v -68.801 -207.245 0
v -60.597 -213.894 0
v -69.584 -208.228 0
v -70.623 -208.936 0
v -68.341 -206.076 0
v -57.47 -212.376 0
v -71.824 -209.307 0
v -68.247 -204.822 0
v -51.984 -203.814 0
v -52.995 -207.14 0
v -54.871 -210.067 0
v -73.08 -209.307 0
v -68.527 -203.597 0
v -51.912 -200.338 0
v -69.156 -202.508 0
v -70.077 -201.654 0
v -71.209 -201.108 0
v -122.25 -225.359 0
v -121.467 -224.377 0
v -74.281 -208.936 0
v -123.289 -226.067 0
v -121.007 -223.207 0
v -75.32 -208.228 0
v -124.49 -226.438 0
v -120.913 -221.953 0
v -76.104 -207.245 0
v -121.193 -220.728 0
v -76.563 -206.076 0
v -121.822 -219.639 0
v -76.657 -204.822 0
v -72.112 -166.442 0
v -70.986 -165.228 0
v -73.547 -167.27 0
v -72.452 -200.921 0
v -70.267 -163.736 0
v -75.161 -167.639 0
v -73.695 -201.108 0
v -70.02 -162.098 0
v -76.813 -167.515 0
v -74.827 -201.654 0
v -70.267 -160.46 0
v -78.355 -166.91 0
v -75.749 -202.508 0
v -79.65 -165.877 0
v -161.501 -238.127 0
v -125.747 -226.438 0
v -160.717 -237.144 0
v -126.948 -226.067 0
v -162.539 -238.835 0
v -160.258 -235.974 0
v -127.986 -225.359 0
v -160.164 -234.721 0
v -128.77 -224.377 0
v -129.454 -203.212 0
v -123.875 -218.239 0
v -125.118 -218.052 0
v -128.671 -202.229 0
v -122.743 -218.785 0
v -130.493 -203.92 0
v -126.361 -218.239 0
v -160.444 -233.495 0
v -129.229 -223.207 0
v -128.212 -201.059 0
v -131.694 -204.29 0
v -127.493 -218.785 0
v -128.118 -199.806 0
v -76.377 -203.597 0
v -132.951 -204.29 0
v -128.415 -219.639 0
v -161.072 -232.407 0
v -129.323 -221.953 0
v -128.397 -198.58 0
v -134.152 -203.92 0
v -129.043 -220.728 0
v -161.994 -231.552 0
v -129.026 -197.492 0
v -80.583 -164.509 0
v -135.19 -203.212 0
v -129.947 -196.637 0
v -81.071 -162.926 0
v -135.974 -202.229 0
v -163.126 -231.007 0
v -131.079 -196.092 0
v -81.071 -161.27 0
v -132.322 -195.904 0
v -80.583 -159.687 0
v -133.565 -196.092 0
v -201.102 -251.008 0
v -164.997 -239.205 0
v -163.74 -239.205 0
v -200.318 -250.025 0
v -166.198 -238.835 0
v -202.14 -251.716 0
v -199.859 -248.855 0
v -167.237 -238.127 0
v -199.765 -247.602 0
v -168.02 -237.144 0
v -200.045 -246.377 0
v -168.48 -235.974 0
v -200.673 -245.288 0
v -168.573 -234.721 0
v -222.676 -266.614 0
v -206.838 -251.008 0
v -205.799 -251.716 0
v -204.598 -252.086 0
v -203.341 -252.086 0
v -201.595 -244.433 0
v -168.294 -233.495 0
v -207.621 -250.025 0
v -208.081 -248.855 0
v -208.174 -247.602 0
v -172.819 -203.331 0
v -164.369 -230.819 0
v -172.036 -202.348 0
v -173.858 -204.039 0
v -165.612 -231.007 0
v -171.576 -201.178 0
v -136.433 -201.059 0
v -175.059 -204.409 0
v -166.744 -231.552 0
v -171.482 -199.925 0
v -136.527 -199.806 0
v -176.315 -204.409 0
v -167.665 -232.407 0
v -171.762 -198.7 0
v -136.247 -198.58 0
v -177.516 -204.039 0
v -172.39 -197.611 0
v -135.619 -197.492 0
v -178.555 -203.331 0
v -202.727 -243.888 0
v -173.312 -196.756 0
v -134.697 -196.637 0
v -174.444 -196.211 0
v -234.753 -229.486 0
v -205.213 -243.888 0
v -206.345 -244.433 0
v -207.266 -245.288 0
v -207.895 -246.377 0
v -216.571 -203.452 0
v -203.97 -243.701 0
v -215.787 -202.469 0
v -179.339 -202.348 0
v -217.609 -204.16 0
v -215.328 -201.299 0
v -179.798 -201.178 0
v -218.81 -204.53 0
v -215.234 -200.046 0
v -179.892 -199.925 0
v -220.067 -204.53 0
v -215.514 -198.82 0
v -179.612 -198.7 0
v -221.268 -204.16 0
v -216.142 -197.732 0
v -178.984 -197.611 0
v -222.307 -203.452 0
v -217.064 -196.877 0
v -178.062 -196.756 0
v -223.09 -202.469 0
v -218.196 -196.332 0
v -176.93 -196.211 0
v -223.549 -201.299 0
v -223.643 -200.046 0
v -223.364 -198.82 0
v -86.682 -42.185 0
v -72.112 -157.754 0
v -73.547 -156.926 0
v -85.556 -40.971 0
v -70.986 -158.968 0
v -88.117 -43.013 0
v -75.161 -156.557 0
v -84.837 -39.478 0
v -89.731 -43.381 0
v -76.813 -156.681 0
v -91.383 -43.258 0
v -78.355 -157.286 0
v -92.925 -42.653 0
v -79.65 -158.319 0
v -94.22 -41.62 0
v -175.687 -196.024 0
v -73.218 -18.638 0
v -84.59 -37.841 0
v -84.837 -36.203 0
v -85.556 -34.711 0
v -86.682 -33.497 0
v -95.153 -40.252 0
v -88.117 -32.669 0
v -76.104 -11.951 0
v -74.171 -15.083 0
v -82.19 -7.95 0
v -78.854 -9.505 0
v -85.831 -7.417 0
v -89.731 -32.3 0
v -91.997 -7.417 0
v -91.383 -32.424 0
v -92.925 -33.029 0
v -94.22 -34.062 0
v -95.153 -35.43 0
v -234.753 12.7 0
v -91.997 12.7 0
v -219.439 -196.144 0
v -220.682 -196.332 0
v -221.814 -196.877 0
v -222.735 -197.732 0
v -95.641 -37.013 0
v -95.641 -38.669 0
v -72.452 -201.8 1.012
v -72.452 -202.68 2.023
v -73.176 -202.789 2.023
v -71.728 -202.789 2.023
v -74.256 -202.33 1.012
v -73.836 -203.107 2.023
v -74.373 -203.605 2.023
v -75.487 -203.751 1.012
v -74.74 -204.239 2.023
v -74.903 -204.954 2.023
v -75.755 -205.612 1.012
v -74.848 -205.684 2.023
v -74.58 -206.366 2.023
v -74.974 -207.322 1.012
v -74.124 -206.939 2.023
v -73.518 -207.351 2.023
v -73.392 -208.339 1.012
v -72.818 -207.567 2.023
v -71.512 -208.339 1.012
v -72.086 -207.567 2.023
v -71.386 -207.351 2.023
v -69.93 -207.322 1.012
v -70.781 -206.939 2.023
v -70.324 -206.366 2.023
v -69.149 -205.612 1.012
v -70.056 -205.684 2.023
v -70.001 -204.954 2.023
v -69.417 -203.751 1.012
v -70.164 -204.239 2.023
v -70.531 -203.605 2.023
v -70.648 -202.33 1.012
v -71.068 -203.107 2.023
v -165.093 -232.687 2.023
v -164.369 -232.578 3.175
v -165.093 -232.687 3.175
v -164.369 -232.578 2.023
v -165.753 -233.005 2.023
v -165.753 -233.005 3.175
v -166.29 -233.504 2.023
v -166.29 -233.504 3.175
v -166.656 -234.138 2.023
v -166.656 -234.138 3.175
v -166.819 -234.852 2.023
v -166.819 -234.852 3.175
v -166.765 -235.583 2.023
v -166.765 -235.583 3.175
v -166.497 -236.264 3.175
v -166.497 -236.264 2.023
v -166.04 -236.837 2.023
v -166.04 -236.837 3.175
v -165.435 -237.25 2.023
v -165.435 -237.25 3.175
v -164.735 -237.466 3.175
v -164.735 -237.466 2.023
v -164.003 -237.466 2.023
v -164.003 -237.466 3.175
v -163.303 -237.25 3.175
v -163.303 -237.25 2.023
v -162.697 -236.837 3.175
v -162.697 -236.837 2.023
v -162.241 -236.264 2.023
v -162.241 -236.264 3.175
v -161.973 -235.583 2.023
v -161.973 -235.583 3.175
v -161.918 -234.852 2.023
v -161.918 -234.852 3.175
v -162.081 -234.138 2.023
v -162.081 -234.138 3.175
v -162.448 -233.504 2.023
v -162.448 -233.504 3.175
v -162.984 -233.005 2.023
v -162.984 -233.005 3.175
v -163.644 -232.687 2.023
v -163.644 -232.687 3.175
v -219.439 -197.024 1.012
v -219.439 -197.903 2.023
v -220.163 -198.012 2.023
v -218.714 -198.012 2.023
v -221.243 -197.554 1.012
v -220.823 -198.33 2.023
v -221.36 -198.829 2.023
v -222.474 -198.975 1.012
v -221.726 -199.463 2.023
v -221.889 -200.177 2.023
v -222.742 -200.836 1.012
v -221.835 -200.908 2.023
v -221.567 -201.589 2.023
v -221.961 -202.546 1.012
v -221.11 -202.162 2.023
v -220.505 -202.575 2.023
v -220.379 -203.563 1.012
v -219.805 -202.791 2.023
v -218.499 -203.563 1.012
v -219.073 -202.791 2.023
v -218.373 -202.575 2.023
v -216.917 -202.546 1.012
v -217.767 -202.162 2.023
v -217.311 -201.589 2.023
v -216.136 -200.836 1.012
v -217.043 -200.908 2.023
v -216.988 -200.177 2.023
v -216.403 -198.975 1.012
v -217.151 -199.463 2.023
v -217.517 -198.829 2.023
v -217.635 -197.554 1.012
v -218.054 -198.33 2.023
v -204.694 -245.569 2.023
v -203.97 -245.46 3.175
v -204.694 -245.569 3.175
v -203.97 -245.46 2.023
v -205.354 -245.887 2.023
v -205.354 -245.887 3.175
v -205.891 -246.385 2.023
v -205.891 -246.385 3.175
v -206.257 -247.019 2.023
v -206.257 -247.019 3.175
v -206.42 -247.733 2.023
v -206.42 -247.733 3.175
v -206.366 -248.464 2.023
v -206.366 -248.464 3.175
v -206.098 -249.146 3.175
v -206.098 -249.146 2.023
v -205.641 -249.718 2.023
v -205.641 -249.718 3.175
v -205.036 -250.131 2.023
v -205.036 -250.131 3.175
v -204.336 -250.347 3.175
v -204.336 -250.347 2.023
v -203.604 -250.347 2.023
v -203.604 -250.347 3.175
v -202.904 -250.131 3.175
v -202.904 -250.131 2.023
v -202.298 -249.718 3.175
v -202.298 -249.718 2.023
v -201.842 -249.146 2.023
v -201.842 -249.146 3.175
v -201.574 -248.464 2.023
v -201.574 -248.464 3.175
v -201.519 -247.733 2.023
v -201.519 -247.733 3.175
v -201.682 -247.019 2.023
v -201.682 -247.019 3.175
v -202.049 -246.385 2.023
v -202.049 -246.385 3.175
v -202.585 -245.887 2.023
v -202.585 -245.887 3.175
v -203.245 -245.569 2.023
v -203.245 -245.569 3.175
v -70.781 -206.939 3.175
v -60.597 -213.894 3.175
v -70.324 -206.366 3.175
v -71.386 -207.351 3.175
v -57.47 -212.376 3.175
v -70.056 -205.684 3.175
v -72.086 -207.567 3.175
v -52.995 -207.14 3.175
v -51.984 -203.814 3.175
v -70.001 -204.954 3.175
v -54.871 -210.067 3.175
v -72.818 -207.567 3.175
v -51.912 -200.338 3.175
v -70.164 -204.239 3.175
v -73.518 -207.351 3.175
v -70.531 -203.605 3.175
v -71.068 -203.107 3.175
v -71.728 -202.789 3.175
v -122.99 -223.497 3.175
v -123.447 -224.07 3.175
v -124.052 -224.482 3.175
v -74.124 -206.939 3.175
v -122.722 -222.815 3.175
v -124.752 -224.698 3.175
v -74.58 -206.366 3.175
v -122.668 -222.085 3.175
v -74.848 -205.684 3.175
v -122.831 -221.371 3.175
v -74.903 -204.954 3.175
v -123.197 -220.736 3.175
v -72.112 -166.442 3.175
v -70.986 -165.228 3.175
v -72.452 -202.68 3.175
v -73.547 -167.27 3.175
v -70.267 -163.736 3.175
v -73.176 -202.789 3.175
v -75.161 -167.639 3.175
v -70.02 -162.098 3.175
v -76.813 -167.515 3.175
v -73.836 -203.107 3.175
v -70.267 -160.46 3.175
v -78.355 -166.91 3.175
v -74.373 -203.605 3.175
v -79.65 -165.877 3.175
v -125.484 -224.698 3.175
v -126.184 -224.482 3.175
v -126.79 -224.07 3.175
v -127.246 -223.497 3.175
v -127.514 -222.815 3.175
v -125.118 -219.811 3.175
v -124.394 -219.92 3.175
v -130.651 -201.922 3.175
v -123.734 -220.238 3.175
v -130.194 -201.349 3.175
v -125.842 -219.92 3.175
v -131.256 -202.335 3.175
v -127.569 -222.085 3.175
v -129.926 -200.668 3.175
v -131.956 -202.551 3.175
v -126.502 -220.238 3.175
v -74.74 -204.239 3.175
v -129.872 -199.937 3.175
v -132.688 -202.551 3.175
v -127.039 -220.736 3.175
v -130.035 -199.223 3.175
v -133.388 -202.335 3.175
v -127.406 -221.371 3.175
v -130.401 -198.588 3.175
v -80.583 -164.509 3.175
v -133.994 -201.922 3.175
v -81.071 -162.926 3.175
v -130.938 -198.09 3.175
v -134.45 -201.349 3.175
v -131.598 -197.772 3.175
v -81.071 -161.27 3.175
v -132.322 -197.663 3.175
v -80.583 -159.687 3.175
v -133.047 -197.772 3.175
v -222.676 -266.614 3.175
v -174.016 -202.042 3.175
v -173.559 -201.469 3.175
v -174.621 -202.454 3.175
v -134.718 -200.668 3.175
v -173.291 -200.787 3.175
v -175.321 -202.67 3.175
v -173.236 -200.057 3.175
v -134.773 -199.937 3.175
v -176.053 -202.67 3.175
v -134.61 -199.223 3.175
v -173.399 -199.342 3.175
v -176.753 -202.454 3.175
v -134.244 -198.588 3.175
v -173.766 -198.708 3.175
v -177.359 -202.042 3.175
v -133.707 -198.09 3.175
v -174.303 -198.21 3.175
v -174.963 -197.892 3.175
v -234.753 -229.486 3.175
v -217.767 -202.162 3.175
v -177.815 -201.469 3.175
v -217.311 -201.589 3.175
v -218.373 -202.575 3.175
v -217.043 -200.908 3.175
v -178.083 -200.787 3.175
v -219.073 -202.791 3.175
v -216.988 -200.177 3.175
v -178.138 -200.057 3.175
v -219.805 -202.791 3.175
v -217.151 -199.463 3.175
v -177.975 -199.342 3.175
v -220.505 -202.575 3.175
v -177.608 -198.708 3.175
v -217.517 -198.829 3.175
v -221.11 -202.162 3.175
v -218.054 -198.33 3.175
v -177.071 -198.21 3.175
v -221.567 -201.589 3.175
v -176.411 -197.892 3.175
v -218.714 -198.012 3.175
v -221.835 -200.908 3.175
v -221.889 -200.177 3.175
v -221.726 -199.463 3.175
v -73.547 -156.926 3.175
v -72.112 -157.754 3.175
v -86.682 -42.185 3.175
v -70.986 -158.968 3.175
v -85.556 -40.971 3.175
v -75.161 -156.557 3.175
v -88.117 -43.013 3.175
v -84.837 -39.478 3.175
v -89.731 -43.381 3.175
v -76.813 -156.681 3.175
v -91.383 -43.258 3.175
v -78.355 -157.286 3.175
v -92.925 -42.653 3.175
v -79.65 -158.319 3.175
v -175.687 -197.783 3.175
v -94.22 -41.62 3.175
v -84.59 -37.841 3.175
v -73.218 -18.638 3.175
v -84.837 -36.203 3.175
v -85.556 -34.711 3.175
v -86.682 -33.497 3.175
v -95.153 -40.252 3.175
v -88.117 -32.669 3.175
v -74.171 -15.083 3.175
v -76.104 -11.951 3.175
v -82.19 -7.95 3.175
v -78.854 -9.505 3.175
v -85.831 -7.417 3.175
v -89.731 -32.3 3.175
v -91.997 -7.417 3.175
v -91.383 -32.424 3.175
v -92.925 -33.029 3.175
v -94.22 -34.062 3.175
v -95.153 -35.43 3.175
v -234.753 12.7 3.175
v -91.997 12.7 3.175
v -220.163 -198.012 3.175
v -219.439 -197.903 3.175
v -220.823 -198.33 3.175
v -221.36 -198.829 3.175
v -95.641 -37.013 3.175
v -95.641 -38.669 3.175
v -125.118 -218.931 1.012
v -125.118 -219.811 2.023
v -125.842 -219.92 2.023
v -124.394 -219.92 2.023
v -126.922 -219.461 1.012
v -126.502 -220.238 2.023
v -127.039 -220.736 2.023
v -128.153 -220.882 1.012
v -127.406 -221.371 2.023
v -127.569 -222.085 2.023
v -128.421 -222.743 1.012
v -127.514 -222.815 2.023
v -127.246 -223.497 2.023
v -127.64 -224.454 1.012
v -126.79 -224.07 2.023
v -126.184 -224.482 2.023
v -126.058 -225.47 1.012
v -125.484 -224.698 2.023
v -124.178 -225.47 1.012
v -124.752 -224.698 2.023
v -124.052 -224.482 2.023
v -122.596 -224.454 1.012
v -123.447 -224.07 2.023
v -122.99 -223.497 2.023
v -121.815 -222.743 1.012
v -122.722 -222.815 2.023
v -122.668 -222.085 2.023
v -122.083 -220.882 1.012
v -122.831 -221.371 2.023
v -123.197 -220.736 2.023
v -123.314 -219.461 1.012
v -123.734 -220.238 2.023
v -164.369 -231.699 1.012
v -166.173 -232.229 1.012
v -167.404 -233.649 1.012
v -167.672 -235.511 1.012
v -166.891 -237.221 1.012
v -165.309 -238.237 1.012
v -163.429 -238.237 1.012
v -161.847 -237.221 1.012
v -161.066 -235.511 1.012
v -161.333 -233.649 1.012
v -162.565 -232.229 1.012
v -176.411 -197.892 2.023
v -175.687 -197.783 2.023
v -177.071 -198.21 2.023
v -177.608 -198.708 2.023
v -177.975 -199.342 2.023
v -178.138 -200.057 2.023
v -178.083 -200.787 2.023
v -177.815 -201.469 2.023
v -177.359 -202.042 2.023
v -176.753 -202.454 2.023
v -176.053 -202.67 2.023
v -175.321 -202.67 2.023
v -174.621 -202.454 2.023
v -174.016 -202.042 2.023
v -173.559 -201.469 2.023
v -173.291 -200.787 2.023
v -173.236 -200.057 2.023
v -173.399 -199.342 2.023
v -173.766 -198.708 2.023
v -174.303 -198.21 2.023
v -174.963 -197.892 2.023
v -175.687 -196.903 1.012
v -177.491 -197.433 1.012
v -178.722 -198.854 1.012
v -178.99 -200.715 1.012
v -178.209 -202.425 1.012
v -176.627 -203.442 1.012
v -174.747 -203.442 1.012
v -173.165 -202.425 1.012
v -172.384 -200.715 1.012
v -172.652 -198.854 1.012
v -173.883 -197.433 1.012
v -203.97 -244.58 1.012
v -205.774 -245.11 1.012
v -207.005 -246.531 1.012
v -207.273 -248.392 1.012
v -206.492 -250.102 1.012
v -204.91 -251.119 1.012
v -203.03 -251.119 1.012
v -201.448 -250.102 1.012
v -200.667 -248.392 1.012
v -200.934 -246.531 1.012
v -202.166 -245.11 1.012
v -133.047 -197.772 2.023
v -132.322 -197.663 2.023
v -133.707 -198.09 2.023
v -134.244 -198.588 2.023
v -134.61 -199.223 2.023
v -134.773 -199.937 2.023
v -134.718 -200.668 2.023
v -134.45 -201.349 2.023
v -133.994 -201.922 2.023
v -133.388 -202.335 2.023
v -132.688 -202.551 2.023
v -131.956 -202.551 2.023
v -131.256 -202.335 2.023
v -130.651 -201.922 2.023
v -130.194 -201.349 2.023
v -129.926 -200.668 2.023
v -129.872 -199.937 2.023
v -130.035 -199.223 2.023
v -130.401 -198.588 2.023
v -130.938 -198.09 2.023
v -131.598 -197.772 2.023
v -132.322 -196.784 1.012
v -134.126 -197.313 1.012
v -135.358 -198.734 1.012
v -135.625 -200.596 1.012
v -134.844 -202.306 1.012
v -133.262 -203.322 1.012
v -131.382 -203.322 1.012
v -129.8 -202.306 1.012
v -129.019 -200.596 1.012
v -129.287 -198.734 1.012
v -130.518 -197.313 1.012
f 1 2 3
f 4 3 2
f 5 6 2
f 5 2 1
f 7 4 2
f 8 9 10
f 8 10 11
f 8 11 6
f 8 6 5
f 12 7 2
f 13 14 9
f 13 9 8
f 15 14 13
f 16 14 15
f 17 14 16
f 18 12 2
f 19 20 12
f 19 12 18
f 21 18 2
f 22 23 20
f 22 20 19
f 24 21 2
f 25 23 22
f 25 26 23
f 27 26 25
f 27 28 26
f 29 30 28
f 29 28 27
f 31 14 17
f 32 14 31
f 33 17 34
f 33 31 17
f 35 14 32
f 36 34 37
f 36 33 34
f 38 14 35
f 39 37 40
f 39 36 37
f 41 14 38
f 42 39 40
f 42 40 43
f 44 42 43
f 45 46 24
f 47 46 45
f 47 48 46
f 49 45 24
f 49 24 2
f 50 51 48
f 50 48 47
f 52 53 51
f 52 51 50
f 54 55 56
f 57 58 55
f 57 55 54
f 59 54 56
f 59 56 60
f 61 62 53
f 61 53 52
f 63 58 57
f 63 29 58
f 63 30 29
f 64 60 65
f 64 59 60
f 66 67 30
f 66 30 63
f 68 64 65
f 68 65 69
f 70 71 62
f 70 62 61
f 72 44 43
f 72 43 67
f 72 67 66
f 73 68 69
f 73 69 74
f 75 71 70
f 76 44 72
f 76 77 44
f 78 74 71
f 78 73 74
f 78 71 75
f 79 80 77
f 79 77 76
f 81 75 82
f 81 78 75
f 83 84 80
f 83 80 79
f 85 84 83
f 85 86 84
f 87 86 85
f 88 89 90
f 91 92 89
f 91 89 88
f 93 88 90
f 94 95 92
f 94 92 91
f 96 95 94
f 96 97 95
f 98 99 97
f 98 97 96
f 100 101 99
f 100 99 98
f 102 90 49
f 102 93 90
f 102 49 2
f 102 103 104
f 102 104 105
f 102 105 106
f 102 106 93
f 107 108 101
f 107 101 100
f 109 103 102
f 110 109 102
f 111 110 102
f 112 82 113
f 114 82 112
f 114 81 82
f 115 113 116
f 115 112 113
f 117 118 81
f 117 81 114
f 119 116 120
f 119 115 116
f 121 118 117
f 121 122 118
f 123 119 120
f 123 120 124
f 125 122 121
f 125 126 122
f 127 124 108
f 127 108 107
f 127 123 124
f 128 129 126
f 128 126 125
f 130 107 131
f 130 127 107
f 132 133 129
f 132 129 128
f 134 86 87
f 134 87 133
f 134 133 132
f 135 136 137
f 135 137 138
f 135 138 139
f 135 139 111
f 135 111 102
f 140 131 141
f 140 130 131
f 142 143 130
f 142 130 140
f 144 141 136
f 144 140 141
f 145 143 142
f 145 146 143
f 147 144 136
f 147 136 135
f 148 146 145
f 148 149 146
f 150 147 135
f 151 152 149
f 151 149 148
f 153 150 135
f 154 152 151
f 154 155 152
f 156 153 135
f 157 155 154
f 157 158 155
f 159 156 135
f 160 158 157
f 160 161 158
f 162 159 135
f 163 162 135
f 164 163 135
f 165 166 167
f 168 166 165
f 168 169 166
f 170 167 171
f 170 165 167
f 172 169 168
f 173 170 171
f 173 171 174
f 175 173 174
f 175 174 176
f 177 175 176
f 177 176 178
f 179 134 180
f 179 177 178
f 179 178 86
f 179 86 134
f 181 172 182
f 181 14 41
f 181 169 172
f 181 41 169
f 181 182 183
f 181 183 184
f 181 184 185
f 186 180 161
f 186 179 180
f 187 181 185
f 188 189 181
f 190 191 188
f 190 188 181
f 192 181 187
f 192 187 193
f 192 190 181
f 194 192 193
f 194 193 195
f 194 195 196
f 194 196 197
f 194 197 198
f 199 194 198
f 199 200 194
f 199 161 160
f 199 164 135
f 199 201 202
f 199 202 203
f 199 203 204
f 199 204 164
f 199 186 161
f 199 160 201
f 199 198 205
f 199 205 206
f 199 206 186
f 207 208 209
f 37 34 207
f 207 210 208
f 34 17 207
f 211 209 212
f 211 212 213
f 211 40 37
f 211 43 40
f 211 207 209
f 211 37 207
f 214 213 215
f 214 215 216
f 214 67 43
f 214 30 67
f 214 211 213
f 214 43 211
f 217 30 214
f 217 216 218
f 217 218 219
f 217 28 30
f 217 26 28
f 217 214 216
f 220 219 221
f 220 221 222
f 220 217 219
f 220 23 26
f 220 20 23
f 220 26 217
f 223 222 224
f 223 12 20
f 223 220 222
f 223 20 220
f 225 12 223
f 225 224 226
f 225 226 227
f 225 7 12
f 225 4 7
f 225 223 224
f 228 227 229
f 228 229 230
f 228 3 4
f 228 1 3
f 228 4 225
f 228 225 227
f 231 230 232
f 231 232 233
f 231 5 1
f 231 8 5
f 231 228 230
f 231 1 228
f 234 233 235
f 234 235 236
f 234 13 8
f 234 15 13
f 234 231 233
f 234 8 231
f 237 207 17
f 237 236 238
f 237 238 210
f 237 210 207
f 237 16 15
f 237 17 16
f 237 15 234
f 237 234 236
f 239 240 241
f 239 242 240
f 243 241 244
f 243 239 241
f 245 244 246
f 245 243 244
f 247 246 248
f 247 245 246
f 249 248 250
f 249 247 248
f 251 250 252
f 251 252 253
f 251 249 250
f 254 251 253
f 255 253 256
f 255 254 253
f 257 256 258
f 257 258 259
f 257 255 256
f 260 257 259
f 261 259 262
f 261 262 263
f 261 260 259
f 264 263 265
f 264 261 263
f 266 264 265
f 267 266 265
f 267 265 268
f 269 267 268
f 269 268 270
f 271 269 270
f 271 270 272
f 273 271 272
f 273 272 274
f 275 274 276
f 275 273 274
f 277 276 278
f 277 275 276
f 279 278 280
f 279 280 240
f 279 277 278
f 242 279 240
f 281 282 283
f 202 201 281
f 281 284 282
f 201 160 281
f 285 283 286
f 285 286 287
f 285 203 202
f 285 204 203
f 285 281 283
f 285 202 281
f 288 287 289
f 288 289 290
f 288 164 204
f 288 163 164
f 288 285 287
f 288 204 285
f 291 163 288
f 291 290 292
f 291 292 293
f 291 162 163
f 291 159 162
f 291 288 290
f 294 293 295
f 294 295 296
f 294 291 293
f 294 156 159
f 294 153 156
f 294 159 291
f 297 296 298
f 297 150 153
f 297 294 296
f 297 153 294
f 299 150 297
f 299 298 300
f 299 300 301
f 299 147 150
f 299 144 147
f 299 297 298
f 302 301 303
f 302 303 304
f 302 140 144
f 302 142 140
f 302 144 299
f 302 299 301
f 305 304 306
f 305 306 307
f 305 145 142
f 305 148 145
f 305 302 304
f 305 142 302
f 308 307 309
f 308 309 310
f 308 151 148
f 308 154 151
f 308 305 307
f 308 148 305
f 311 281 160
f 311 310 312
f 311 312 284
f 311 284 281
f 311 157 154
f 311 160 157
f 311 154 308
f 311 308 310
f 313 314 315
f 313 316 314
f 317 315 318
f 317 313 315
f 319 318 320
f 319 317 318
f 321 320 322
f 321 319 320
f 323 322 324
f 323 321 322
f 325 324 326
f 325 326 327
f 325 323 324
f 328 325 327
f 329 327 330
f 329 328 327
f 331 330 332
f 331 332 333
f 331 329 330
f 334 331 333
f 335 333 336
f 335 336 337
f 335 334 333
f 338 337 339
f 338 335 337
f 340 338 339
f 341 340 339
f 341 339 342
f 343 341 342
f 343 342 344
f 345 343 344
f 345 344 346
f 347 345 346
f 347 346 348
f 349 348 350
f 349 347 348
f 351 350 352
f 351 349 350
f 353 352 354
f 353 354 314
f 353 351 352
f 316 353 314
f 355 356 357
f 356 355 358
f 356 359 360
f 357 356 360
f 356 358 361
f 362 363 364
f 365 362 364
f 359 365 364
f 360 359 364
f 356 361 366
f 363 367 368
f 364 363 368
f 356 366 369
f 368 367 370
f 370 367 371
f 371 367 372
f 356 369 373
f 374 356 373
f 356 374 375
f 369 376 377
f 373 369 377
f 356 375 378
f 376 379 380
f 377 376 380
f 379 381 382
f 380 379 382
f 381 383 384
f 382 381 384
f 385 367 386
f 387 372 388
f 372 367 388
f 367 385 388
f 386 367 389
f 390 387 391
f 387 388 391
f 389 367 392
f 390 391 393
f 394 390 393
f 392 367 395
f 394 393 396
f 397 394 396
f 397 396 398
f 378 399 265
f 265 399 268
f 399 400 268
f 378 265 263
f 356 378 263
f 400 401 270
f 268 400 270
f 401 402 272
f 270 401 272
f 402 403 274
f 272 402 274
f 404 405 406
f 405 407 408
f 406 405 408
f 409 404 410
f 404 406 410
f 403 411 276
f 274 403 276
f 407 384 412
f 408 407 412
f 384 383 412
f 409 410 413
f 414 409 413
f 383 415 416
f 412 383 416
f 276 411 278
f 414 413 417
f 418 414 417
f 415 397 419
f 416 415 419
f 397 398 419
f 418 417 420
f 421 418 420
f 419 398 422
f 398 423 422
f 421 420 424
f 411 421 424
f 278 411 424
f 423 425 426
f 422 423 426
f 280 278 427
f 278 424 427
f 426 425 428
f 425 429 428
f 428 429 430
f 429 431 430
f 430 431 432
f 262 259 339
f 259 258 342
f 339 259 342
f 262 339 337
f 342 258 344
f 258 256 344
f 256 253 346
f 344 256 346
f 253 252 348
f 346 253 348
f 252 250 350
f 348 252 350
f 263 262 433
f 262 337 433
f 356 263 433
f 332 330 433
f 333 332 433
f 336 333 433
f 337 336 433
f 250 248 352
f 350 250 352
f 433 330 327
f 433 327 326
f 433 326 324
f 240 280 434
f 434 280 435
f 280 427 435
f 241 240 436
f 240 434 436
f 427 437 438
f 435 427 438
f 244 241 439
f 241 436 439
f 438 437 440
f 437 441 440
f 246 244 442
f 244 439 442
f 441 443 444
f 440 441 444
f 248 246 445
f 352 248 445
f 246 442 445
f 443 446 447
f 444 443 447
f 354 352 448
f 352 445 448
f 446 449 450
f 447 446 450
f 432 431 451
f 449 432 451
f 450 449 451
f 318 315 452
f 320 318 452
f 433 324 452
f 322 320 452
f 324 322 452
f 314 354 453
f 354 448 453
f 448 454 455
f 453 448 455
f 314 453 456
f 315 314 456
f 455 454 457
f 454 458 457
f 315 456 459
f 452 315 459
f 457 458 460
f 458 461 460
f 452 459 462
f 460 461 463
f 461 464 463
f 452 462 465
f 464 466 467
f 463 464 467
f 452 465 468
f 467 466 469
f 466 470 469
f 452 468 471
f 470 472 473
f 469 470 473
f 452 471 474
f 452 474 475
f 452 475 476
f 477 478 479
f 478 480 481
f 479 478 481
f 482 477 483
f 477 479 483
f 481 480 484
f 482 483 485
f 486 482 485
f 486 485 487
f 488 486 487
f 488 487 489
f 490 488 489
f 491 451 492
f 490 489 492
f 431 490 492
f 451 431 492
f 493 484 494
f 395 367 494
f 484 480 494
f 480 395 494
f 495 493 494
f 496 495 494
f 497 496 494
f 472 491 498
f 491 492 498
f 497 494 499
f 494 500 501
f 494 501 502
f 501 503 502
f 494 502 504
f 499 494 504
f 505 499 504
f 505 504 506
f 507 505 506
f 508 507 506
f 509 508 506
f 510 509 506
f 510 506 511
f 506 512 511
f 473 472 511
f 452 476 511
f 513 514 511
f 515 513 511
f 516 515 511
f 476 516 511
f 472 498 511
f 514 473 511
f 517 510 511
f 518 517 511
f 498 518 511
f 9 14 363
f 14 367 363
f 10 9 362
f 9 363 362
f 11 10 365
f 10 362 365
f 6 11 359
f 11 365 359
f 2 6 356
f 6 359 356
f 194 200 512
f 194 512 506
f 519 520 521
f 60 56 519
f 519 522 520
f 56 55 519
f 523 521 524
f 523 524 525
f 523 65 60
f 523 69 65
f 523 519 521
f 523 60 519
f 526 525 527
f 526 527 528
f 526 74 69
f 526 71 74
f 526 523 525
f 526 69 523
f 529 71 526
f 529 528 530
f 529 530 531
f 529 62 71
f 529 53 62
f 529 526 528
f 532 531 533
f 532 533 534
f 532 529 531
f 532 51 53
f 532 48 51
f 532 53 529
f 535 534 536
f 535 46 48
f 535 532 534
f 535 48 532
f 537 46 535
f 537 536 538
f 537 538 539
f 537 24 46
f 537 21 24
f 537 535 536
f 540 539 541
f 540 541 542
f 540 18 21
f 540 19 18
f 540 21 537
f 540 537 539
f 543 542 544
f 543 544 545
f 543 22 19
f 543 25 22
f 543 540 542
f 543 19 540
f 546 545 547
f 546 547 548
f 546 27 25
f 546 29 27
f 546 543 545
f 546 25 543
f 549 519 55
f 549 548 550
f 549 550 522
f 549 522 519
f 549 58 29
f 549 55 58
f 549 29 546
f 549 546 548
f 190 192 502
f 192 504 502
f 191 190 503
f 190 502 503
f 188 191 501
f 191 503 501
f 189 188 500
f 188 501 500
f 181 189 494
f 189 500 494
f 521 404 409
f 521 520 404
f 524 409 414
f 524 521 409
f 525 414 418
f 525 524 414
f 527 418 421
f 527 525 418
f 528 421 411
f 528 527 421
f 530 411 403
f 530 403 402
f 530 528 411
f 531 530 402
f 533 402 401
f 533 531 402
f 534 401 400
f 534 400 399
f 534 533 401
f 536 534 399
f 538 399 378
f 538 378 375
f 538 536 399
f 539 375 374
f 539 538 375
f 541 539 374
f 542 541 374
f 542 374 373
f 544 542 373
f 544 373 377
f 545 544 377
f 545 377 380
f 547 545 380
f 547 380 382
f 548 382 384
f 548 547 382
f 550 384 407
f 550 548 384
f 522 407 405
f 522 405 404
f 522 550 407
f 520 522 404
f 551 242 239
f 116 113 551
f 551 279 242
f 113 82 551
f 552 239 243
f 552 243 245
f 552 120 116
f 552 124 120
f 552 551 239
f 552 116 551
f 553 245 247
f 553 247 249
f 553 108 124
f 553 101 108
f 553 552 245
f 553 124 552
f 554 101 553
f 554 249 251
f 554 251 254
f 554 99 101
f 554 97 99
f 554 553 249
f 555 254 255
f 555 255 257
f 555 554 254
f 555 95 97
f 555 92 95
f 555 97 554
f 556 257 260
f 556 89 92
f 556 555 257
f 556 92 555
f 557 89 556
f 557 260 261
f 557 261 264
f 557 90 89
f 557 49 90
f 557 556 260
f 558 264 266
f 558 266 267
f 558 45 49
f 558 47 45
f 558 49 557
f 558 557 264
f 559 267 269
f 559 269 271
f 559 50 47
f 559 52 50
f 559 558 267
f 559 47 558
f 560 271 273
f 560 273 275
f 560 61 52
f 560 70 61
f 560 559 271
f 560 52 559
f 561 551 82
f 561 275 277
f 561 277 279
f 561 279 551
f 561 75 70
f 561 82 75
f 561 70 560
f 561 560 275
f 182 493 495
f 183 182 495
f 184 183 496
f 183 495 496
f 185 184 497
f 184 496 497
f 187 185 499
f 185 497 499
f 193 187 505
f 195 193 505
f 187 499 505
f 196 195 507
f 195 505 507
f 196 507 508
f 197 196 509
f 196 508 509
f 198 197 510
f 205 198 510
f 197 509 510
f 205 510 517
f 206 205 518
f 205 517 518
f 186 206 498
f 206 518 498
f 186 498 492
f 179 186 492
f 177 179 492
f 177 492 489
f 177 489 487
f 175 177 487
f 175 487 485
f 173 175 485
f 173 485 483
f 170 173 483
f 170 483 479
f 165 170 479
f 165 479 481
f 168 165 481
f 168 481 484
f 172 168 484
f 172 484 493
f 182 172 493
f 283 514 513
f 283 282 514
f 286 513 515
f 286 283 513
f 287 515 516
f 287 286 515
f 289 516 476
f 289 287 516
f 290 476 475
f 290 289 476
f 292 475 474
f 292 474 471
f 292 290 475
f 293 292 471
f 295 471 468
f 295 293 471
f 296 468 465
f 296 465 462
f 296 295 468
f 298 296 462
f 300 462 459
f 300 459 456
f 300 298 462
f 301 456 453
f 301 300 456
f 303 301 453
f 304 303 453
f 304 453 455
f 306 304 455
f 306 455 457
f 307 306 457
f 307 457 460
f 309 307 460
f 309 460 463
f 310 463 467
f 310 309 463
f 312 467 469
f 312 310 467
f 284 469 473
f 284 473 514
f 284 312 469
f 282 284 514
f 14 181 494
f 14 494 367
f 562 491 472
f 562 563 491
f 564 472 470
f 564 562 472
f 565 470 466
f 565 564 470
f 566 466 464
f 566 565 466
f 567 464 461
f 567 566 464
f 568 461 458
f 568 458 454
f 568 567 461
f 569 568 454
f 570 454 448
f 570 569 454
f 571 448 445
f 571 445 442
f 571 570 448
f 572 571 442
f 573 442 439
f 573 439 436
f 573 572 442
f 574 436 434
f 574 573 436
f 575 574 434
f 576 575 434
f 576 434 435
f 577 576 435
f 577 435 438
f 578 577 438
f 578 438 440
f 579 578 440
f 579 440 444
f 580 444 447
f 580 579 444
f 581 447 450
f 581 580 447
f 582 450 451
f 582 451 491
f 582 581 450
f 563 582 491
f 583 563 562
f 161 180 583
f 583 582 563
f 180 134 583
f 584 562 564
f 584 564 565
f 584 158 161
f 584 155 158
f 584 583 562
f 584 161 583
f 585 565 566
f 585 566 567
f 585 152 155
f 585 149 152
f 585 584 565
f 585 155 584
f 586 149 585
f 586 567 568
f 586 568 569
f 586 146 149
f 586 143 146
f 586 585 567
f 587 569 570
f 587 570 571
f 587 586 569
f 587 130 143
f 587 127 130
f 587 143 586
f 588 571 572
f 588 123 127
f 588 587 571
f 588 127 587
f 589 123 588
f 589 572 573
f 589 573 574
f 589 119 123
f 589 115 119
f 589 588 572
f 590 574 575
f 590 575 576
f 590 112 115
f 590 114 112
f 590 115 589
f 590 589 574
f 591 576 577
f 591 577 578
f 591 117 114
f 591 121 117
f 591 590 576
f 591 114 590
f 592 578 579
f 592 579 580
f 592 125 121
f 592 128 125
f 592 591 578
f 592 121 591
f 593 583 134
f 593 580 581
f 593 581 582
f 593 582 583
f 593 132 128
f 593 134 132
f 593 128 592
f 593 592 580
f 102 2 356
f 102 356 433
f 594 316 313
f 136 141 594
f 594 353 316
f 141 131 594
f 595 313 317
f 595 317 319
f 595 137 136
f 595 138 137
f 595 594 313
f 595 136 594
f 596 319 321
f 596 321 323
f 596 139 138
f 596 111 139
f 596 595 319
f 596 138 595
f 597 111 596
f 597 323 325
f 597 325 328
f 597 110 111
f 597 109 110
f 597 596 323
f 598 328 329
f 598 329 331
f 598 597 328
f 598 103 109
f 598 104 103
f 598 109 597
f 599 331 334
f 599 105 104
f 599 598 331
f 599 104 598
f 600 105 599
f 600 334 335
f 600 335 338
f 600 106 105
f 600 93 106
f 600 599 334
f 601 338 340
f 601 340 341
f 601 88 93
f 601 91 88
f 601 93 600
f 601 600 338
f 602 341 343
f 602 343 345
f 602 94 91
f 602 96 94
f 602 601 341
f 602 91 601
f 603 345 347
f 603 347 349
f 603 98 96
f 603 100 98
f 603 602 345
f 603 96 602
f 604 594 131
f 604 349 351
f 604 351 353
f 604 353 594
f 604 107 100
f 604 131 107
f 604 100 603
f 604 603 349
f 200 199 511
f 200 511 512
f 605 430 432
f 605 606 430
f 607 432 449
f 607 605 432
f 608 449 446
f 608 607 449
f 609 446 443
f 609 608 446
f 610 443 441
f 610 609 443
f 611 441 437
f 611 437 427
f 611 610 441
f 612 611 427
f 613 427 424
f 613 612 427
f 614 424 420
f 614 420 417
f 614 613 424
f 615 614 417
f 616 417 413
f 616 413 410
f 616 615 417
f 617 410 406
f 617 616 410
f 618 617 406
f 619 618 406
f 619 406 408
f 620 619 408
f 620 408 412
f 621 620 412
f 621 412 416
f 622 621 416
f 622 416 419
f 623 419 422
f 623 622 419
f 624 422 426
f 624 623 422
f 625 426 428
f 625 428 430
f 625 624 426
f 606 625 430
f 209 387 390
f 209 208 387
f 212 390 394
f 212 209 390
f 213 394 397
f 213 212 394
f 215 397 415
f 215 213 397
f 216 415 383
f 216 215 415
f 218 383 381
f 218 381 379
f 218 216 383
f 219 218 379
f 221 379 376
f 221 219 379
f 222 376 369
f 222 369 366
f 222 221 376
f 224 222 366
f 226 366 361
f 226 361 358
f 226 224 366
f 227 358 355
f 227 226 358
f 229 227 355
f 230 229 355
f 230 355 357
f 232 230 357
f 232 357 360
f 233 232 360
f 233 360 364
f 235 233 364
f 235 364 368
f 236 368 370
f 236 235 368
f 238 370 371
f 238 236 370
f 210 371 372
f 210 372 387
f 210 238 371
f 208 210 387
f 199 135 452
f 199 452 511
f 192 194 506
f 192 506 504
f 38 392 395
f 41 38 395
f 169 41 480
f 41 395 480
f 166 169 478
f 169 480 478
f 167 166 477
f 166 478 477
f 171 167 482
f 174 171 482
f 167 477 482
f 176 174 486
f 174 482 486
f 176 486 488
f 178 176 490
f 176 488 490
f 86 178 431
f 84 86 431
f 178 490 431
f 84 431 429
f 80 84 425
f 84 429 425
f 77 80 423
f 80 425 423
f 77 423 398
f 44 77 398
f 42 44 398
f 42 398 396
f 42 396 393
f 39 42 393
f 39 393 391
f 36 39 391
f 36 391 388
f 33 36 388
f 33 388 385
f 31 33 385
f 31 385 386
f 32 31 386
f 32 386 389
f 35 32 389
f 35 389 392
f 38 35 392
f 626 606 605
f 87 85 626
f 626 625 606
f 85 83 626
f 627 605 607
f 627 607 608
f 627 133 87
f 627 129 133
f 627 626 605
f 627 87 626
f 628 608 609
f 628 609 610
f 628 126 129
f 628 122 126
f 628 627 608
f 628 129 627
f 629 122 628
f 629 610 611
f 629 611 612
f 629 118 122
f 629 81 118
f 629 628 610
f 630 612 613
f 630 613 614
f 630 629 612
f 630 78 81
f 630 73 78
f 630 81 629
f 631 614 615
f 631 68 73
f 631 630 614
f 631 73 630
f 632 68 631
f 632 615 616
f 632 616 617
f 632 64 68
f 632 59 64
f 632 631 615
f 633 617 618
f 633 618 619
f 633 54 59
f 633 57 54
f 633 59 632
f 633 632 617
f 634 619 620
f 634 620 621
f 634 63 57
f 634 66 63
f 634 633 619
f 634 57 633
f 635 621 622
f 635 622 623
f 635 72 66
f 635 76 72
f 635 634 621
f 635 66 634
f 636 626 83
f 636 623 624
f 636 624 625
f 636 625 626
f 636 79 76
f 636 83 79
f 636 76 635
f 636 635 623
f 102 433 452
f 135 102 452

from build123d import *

# Parameters (mm, degrees)
BOSS_EXTRUDE1_DEPTH                           = 3.175
FILLET1_R                                     = 12.7
CUT_EXTRUDE1_DEPTH                            = 4.175
CSK_FOR_8_FLAT_HEAD_MACHINE_SCREW1_AT_2_COUNT = 2
CSK_FOR_8_FLAT_HEAD_MACHINE_SCREW1_AT_2_PITCH = 41.643335968
CSK_FOR_8_FLAT_HEAD_MACHINE_SCREW1_AT_3_COUNT = 2
CSK_FOR_8_FLAT_HEAD_MACHINE_SCREW1_AT_3_PITCH = 55.434622241
CSK_FOR_8_FLAT_HEAD_MACHINE_SCREW1_AT_4_COUNT = 2
CSK_FOR_8_FLAT_HEAD_MACHINE_SCREW1_AT_4_PITCH = 50.008853946
CSK_FOR_8_FLAT_HEAD_MACHINE_SCREW1_AT_5_COUNT = 2
CSK_FOR_8_FLAT_HEAD_MACHINE_SCREW1_AT_5_PITCH = 82.918335968
CSK_FOR_8_FLAT_HEAD_MACHINE_SCREW1_AT_6_COUNT = 2
CSK_FOR_8_FLAT_HEAD_MACHINE_SCREW1_AT_6_PITCH = 86.127052655
CSK_FOR_8_FLAT_HEAD_MACHINE_SCREW1_AT_7_COUNT = 2
CSK_FOR_8_FLAT_HEAD_MACHINE_SCREW1_AT_7_PITCH = 138.300491667
CUT_EXTRUDE2_REACH                            = 5.175
SKETCH5_R                                     = 5.55625


with BuildPart() as part:
    # Sketch1 → Boss-Extrude1 (new body)
    with BuildSketch(Plane.XY):
        Polygon((-234.752967181, 12.7), (-91.997327393, 12.7), (-91.997327393, -7.416979032), (-74.533465131, -7.416979032), (-50.700252483, -210.6746006), (-234.752967181, -270.542758328), align=None)
    extrude(amount=BOSS_EXTRUDE1_DEPTH)

    # Fillet1
    fillet1_edges = [part.edges().sort_by_distance(p)[0] for p in [
        (-74.533465131, -7.416979032, 1.5875),
        (-50.700252483, -210.6746006, 1.5875),
    ]]
    fillet(fillet1_edges, radius=FILLET1_R)

    # Sketch2 → Cut-Extrude1 (cut, through all)
    with BuildSketch(Plane.XY.offset(3.175)):
        Polygon((-234.752967181, -270.542758328), (-222.67581909, -266.614337017), (-234.752967181, -229.485553098), align=None)
    extrude(amount=-CUT_EXTRUDE1_DEPTH, mode=Mode.SUBTRACT)

    # Sketch4 → CSK for #8 Flat Head Machine Screw1 (revolve, cut)
    with BuildSketch(Plane(origin=(-203.96982343, -247.917009556, 0), x_dir=(0, 1, 0), z_dir=(1, 0, 0))):
        Polygon((0, 0), (0, 3.175), (2.45745, 3.175), (2.45745, 2.02344051), (4.2164, 0), align=None)
    csk_for_8_flat_head_machine_screw1 = revolve(axis=Axis((-203.96982343, -247.917009556, -6.35), (0, 0, 1)), mode=Mode.SUBTRACT)

    # CSK for #8 Flat Head Machine Screw1 at 2: CSK for #8 Flat Head Machine Screw1 ×2
    with Locations(*[Vector(0.950956543, 0.309324513, 0) * (i * CSK_FOR_8_FLAT_HEAD_MACHINE_SCREW1_AT_2_PITCH) for i in range(1, CSK_FOR_8_FLAT_HEAD_MACHINE_SCREW1_AT_2_COUNT)]):
        add(csk_for_8_flat_head_machine_screw1, mode=Mode.SUBTRACT)

    # CSK for #8 Flat Head Machine Screw1 at 3: CSK for #8 Flat Head Machine Screw1 ×2
    with Locations(*[Vector(0.510201208, 0.860055072, 0) * (i * CSK_FOR_8_FLAT_HEAD_MACHINE_SCREW1_AT_3_PITCH) for i in range(1, CSK_FOR_8_FLAT_HEAD_MACHINE_SCREW1_AT_3_COUNT)]):
        add(csk_for_8_flat_head_machine_screw1, mode=Mode.SUBTRACT)

    # CSK for #8 Flat Head Machine Screw1 at 4: CSK for #8 Flat Head Machine Screw1 ×2
    with Locations(*[Vector(-0.309324513, 0.950956543, 0) * (i * CSK_FOR_8_FLAT_HEAD_MACHINE_SCREW1_AT_4_PITCH) for i in range(1, CSK_FOR_8_FLAT_HEAD_MACHINE_SCREW1_AT_4_COUNT)]):
        add(csk_for_8_flat_head_machine_screw1, mode=Mode.SUBTRACT)

    # CSK for #8 Flat Head Machine Screw1 at 5: CSK for #8 Flat Head Machine Screw1 ×2
    with Locations(*[Vector(0.950956543, 0.309324513, 0) * (i * CSK_FOR_8_FLAT_HEAD_MACHINE_SCREW1_AT_5_PITCH) for i in range(1, CSK_FOR_8_FLAT_HEAD_MACHINE_SCREW1_AT_5_COUNT)]):
        add(csk_for_8_flat_head_machine_screw1, mode=Mode.SUBTRACT)

    # CSK for #8 Flat Head Machine Screw1 at 6: CSK for #8 Flat Head Machine Screw1 ×2
    with Locations(*[Vector(0.83188266, 0.554951566, 0) * (i * CSK_FOR_8_FLAT_HEAD_MACHINE_SCREW1_AT_6_PITCH) for i in range(1, CSK_FOR_8_FLAT_HEAD_MACHINE_SCREW1_AT_6_COUNT)]):
        add(csk_for_8_flat_head_machine_screw1, mode=Mode.SUBTRACT)

    # CSK for #8 Flat Head Machine Screw1 at 7: CSK for #8 Flat Head Machine Screw1 ×2
    with Locations(*[Vector(0.950956543, 0.309324513, 0) * (i * CSK_FOR_8_FLAT_HEAD_MACHINE_SCREW1_AT_7_PITCH) for i in range(1, CSK_FOR_8_FLAT_HEAD_MACHINE_SCREW1_AT_7_COUNT)]):
        add(csk_for_8_flat_head_machine_screw1, mode=Mode.SUBTRACT)

    # Sketch5 → Cut-Extrude2 (cut, up to next)
    with BuildSketch(Plane.XY.offset(3.175), mode=Mode.PRIVATE) as cut_extrude2_sk1:
        with Locations((-90.146601991, -37.840751583)):
            Circle(SKETCH5_R)
    cut_extrude2_tool1 = extrude(cut_extrude2_sk1.sketch, amount=-CUT_EXTRUDE2_REACH, mode=Mode.PRIVATE) & part.part
    add(cut_extrude2_tool1.solids().sort_by_distance((-90.146602, -37.840752, 3.175))[0], mode=Mode.SUBTRACT)
    # Sketch5 → Cut-Extrude2 (cut, up to next)
    with BuildSketch(Plane.XY.offset(3.175), mode=Mode.PRIVATE) as cut_extrude2_sk2:
        with Locations((-75.576674395, -162.097975039)):
            Circle(SKETCH5_R)
    cut_extrude2_tool2 = extrude(cut_extrude2_sk2.sketch, amount=-CUT_EXTRUDE2_REACH, mode=Mode.PRIVATE) & part.part
    add(cut_extrude2_tool2.solids().sort_by_distance((-75.576674, -162.097975, 3.175))[0], mode=Mode.SUBTRACT)


solid = part.part
